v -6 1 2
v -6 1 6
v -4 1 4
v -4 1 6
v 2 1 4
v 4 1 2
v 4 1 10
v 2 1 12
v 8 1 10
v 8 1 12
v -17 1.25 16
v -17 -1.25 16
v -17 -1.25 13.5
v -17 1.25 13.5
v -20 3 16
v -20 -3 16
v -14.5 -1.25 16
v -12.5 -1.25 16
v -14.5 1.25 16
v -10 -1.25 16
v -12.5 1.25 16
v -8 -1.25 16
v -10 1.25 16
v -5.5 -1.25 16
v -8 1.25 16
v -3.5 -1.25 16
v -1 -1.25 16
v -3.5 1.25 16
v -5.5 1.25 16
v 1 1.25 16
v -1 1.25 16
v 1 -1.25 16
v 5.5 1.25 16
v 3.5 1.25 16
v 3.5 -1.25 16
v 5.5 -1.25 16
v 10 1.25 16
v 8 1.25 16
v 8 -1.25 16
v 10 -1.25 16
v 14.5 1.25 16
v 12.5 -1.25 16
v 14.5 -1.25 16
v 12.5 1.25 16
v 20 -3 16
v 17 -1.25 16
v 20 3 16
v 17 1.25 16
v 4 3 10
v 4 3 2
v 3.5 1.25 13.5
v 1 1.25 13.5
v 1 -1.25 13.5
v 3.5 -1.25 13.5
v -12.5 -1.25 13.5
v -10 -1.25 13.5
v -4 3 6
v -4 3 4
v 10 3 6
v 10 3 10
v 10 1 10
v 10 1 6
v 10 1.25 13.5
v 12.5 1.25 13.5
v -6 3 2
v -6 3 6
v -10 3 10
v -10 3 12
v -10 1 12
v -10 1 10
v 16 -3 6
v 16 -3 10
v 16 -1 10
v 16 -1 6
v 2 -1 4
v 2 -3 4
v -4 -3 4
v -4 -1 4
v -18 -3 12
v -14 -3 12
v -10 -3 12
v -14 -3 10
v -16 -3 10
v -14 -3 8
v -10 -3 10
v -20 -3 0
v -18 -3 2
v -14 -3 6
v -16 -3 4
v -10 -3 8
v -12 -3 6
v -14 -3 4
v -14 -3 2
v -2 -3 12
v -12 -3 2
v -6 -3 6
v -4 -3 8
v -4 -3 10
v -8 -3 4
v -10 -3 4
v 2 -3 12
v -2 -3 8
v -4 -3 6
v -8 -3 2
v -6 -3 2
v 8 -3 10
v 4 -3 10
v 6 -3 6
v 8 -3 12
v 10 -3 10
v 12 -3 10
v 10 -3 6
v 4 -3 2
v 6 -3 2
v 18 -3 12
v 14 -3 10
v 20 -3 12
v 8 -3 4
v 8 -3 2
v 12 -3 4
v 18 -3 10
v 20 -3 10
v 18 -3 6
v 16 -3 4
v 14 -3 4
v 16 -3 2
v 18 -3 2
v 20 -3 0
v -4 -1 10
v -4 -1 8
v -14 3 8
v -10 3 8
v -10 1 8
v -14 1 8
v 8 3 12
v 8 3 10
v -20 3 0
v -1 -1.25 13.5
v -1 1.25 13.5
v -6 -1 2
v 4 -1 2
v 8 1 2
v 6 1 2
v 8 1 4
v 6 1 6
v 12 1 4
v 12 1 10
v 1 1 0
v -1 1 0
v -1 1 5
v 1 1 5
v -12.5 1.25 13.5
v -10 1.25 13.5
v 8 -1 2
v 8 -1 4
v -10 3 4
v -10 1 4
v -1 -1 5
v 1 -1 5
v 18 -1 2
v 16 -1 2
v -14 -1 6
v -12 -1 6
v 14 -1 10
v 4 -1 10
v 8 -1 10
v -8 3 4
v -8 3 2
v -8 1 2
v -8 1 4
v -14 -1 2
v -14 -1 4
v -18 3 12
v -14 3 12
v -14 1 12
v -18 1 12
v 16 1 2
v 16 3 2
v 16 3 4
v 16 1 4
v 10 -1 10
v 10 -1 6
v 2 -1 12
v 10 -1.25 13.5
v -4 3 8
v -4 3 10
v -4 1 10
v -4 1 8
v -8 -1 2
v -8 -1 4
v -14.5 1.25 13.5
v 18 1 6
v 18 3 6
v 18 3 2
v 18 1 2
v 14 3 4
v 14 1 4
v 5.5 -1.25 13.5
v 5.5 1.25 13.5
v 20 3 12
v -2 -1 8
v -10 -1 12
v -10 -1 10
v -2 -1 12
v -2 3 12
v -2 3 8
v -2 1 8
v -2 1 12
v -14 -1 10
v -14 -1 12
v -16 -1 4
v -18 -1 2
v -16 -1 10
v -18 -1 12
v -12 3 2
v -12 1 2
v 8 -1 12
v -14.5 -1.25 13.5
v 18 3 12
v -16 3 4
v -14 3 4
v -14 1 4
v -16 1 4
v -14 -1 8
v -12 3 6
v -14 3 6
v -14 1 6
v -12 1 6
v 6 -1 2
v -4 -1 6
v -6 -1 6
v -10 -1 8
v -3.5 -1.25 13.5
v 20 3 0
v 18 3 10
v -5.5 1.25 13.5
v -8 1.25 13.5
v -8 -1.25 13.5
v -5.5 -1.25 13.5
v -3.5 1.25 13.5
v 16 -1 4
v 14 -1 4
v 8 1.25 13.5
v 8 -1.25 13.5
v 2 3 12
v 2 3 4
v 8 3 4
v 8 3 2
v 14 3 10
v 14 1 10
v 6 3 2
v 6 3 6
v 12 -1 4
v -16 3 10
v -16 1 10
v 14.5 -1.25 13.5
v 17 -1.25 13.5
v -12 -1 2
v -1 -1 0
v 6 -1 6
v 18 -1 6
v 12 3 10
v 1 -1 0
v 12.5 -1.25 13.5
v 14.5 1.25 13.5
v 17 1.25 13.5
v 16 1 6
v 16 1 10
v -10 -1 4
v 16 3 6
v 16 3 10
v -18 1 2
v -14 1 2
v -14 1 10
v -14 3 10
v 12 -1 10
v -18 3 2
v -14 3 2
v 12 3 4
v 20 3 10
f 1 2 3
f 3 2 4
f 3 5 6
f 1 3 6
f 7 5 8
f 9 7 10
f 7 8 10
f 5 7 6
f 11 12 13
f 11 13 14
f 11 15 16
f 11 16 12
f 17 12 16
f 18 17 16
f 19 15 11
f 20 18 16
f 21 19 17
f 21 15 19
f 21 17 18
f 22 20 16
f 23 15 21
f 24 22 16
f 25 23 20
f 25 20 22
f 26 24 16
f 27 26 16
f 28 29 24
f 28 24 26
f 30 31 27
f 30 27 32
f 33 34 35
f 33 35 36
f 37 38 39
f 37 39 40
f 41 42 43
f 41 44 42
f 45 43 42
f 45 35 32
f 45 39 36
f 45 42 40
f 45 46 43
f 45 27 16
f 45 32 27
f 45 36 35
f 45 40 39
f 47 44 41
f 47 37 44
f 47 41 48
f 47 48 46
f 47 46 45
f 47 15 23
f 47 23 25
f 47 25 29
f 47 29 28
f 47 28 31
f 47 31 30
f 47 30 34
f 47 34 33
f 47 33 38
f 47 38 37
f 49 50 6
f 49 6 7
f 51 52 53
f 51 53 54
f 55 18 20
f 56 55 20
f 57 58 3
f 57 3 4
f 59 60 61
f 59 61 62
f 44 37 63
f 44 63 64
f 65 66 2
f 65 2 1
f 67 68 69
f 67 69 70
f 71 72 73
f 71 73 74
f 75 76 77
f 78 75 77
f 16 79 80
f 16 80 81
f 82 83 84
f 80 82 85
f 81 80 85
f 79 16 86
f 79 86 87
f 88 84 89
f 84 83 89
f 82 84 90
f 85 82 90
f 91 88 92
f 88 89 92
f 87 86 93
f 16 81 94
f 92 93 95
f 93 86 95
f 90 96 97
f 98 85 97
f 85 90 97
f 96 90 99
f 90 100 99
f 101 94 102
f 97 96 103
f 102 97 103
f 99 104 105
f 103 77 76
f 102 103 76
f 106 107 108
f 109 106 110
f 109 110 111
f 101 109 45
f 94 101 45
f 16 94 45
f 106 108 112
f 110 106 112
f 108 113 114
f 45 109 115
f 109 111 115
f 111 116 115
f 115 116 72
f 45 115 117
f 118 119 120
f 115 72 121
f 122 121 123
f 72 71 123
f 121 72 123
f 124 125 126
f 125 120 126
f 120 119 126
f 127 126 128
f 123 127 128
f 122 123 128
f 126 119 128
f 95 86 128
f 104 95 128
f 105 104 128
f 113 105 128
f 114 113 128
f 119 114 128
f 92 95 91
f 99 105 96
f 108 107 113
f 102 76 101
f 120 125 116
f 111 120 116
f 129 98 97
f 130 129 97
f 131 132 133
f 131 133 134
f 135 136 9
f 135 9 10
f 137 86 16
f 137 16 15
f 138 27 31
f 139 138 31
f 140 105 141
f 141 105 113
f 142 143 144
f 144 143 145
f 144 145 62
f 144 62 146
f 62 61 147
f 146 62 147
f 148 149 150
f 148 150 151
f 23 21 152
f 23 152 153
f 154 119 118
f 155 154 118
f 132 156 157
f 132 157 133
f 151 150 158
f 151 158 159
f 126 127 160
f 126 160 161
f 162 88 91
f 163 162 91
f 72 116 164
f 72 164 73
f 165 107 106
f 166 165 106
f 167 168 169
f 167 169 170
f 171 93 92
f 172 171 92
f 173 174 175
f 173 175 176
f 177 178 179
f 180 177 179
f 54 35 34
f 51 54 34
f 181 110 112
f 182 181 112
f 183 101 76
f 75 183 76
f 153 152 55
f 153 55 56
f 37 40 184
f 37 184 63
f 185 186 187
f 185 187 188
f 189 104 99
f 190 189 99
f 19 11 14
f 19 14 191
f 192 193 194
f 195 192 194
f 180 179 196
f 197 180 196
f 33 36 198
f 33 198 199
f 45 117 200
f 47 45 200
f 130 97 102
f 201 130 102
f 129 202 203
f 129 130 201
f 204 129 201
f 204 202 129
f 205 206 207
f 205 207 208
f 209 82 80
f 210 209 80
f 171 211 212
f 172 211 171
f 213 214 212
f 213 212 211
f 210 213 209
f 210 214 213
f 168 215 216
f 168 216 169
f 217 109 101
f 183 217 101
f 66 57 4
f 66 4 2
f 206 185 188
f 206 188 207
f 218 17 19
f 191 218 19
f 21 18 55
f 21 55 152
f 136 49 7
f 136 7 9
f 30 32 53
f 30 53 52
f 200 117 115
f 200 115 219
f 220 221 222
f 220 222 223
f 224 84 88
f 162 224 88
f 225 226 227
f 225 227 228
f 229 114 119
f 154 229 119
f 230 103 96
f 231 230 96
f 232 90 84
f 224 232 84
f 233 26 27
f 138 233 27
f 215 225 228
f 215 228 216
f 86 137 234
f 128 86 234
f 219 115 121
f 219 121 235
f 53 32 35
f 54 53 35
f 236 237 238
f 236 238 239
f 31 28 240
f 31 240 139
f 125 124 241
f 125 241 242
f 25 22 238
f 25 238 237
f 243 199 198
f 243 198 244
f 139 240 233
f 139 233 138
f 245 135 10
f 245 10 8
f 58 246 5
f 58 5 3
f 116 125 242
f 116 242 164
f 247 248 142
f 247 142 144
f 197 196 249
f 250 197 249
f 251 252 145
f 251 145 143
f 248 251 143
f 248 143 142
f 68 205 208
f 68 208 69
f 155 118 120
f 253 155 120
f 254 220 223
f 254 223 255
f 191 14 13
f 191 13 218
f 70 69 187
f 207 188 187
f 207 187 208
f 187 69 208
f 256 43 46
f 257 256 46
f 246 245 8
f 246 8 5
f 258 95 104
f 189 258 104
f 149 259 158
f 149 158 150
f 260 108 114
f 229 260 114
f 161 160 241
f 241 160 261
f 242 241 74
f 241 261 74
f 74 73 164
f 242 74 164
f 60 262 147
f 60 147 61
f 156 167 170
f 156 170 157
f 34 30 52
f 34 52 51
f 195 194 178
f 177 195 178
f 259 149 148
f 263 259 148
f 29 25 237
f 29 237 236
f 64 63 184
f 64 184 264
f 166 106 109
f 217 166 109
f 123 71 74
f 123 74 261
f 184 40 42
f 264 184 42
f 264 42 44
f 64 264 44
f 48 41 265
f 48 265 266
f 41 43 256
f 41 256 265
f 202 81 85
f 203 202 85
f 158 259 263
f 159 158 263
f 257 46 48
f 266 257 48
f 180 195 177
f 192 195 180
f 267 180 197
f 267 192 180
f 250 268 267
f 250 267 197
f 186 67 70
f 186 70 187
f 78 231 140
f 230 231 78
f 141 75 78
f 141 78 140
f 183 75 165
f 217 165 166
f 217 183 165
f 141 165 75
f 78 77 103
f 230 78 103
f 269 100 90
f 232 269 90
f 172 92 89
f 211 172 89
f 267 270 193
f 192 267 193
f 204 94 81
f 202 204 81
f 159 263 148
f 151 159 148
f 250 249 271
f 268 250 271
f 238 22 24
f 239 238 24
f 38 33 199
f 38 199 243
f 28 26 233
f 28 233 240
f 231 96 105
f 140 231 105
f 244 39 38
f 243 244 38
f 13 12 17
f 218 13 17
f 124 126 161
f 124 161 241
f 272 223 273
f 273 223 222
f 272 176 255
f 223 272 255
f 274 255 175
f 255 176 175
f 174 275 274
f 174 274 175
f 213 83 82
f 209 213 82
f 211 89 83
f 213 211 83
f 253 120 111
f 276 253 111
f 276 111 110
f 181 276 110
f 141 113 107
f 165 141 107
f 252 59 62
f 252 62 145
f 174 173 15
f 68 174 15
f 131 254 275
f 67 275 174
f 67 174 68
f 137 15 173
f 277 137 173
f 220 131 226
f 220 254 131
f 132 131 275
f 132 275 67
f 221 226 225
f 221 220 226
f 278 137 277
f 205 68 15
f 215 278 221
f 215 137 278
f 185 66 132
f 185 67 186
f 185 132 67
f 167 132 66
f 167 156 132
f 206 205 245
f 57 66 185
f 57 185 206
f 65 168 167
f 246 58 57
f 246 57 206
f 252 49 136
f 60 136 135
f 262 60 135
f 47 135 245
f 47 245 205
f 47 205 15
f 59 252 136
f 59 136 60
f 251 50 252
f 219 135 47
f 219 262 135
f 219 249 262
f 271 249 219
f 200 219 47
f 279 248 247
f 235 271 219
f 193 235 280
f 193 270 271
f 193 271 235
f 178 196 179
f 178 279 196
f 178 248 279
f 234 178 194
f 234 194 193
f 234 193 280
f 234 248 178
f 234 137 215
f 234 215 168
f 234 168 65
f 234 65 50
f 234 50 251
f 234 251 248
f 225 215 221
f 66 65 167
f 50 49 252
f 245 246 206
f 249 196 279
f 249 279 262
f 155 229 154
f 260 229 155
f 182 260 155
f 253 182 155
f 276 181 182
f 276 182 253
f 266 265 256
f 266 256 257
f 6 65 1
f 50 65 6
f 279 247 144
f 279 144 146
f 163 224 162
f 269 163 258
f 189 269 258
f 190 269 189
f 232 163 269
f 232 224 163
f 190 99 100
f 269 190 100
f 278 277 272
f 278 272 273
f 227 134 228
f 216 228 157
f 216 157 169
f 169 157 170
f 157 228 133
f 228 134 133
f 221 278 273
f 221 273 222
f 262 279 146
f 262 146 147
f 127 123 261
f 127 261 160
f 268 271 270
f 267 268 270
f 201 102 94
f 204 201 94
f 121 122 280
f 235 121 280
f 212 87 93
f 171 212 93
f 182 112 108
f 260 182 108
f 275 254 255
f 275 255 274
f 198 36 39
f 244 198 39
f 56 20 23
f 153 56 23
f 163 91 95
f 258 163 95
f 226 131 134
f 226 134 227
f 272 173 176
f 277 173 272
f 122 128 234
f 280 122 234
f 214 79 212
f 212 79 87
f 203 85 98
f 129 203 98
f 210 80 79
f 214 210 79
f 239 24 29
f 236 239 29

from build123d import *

# Parameters (mm, degrees)
SKETCH_W        = 40
SKETCH_H        = 6
PAD_DEPTH       = 16
SKETCH001_W     = 2.5
SKETCH001_H     = 2.5
POCKET_DEPTH    = 2.5
POCKET001_DEPTH = 2
POCKET002_DEPTH = 2
SKETCH009_W     = 6
SKETCH009_H     = 2
POCKET003_DEPTH = 2
SKETCH010_W     = 2
SKETCH010_H     = 2
PAD001_DEPTH    = 5


with BuildPart() as base:
    # Sketch → Pad (new body)
    with BuildSketch(Plane.XY):
        Rectangle(SKETCH_W, SKETCH_H)
    extrude(amount=PAD_DEPTH)

    # Sketch001 (on Face6 of Pad) → Pocket (cut)
    with BuildSketch(Plane.XY.offset(16)):
        with Locations((2.25, 0)):
            Rectangle(SKETCH001_W, SKETCH001_H)
        with Locations((6.75, 0)):
            Rectangle(SKETCH001_W, SKETCH001_H)
        with Locations((11.25, 0)):
            Rectangle(SKETCH001_W, SKETCH001_H)
        with Locations((15.75, 0)):
            Rectangle(SKETCH001_W, SKETCH001_H)
        with Locations((-2.25, 0)):
            Rectangle(SKETCH001_W, SKETCH001_H)
        with Locations((-6.75, 0)):
            Rectangle(SKETCH001_W, SKETCH001_H)
        with Locations((-11.25, 0)):
            Rectangle(SKETCH001_W, SKETCH001_H)
        with Locations((-15.75, 0)):
            Rectangle(SKETCH001_W, SKETCH001_H)
    extrude(amount=-POCKET_DEPTH, mode=Mode.SUBTRACT)

    # Sketch008 (on Face2 of Pocket) → Pocket001 (cut)
    with BuildSketch(Plane.XZ.offset(3)):
        Polygon((-18, 12), (-18, 2), (-14, 2), (-14, 4), (-16, 4), (-16, 10), (-14, 10), (-14, 12), align=None)
        Polygon((-10, 12), (-10, 10), (-4, 10), (-4, 8), (-2, 8), (-2, 12), align=None)
        Polygon((-12, 2), (-8, 2), (-8, 4), (-10, 4), (-10, 8), (-14, 8), (-14, 6), (-12, 6), align=None)
        Polygon((-6, 6), (-6, 2), (4, 2), (4, 10), (8, 10), (8, 12), (2, 12), (2, 4), (-4, 4), (-4, 6), align=None)
        Polygon((6, 6), (6, 2), (8, 2), (8, 4), (12, 4), (12, 10), (10, 10), (10, 6), align=None)
        Polygon((14, 4), (14, 10), (16, 10), (16, 6), (18, 6), (18, 2), (16, 2), (16, 4), align=None)
    extrude(amount=-POCKET001_DEPTH, mode=Mode.SUBTRACT)

    # MirroredSketch (on Face3 of Pocket001) → Pocket002 (cut)
    with BuildSketch(Plane(origin=(0, 3, 0), x_dir=(-1, 0, 0), z_dir=(0, 1, 0))):
        Polygon((18, 12), (18, 2), (14, 2), (14, 4), (16, 4), (16, 10), (14, 10), (14, 12), align=None)
        Polygon((10, 12), (10, 10), (4, 10), (4, 8), (2, 8), (2, 12), align=None)
        Polygon((12, 2), (8, 2), (8, 4), (10, 4), (10, 8), (14, 8), (14, 6), (12, 6), align=None)
        Polygon((6, 6), (6, 2), (-4, 2), (-4, 10), (-8, 10), (-8, 12), (-2, 12), (-2, 4), (4, 4), (4, 6), align=None)
        Polygon((-6, 6), (-6, 2), (-8, 2), (-8, 4), (-12, 4), (-12, 10), (-10, 10), (-10, 6), align=None)
        Polygon((-14, 4), (-14, 10), (-16, 10), (-16, 6), (-18, 6), (-18, 2), (-16, 2), (-16, 4), align=None)
    extrude(amount=-POCKET002_DEPTH, mode=Mode.SUBTRACT)

    # Sketch009 (on Face6 of Pocket002) → Pocket003 (cut)
    with BuildSketch(Plane.YZ.offset(20)):
        with Locations((0, 11)):
            Rectangle(SKETCH009_W, SKETCH009_H)
    extrude(amount=-POCKET003_DEPTH, mode=Mode.SUBTRACT)


with BuildPart() as indicator:
    # Sketch010 → Pad001 (new body)
    with BuildSketch(Plane.XY):
        Rectangle(SKETCH010_W, SKETCH010_H)
    extrude(amount=PAD001_DEPTH)


solid = Compound([base.part, indicator.part])
